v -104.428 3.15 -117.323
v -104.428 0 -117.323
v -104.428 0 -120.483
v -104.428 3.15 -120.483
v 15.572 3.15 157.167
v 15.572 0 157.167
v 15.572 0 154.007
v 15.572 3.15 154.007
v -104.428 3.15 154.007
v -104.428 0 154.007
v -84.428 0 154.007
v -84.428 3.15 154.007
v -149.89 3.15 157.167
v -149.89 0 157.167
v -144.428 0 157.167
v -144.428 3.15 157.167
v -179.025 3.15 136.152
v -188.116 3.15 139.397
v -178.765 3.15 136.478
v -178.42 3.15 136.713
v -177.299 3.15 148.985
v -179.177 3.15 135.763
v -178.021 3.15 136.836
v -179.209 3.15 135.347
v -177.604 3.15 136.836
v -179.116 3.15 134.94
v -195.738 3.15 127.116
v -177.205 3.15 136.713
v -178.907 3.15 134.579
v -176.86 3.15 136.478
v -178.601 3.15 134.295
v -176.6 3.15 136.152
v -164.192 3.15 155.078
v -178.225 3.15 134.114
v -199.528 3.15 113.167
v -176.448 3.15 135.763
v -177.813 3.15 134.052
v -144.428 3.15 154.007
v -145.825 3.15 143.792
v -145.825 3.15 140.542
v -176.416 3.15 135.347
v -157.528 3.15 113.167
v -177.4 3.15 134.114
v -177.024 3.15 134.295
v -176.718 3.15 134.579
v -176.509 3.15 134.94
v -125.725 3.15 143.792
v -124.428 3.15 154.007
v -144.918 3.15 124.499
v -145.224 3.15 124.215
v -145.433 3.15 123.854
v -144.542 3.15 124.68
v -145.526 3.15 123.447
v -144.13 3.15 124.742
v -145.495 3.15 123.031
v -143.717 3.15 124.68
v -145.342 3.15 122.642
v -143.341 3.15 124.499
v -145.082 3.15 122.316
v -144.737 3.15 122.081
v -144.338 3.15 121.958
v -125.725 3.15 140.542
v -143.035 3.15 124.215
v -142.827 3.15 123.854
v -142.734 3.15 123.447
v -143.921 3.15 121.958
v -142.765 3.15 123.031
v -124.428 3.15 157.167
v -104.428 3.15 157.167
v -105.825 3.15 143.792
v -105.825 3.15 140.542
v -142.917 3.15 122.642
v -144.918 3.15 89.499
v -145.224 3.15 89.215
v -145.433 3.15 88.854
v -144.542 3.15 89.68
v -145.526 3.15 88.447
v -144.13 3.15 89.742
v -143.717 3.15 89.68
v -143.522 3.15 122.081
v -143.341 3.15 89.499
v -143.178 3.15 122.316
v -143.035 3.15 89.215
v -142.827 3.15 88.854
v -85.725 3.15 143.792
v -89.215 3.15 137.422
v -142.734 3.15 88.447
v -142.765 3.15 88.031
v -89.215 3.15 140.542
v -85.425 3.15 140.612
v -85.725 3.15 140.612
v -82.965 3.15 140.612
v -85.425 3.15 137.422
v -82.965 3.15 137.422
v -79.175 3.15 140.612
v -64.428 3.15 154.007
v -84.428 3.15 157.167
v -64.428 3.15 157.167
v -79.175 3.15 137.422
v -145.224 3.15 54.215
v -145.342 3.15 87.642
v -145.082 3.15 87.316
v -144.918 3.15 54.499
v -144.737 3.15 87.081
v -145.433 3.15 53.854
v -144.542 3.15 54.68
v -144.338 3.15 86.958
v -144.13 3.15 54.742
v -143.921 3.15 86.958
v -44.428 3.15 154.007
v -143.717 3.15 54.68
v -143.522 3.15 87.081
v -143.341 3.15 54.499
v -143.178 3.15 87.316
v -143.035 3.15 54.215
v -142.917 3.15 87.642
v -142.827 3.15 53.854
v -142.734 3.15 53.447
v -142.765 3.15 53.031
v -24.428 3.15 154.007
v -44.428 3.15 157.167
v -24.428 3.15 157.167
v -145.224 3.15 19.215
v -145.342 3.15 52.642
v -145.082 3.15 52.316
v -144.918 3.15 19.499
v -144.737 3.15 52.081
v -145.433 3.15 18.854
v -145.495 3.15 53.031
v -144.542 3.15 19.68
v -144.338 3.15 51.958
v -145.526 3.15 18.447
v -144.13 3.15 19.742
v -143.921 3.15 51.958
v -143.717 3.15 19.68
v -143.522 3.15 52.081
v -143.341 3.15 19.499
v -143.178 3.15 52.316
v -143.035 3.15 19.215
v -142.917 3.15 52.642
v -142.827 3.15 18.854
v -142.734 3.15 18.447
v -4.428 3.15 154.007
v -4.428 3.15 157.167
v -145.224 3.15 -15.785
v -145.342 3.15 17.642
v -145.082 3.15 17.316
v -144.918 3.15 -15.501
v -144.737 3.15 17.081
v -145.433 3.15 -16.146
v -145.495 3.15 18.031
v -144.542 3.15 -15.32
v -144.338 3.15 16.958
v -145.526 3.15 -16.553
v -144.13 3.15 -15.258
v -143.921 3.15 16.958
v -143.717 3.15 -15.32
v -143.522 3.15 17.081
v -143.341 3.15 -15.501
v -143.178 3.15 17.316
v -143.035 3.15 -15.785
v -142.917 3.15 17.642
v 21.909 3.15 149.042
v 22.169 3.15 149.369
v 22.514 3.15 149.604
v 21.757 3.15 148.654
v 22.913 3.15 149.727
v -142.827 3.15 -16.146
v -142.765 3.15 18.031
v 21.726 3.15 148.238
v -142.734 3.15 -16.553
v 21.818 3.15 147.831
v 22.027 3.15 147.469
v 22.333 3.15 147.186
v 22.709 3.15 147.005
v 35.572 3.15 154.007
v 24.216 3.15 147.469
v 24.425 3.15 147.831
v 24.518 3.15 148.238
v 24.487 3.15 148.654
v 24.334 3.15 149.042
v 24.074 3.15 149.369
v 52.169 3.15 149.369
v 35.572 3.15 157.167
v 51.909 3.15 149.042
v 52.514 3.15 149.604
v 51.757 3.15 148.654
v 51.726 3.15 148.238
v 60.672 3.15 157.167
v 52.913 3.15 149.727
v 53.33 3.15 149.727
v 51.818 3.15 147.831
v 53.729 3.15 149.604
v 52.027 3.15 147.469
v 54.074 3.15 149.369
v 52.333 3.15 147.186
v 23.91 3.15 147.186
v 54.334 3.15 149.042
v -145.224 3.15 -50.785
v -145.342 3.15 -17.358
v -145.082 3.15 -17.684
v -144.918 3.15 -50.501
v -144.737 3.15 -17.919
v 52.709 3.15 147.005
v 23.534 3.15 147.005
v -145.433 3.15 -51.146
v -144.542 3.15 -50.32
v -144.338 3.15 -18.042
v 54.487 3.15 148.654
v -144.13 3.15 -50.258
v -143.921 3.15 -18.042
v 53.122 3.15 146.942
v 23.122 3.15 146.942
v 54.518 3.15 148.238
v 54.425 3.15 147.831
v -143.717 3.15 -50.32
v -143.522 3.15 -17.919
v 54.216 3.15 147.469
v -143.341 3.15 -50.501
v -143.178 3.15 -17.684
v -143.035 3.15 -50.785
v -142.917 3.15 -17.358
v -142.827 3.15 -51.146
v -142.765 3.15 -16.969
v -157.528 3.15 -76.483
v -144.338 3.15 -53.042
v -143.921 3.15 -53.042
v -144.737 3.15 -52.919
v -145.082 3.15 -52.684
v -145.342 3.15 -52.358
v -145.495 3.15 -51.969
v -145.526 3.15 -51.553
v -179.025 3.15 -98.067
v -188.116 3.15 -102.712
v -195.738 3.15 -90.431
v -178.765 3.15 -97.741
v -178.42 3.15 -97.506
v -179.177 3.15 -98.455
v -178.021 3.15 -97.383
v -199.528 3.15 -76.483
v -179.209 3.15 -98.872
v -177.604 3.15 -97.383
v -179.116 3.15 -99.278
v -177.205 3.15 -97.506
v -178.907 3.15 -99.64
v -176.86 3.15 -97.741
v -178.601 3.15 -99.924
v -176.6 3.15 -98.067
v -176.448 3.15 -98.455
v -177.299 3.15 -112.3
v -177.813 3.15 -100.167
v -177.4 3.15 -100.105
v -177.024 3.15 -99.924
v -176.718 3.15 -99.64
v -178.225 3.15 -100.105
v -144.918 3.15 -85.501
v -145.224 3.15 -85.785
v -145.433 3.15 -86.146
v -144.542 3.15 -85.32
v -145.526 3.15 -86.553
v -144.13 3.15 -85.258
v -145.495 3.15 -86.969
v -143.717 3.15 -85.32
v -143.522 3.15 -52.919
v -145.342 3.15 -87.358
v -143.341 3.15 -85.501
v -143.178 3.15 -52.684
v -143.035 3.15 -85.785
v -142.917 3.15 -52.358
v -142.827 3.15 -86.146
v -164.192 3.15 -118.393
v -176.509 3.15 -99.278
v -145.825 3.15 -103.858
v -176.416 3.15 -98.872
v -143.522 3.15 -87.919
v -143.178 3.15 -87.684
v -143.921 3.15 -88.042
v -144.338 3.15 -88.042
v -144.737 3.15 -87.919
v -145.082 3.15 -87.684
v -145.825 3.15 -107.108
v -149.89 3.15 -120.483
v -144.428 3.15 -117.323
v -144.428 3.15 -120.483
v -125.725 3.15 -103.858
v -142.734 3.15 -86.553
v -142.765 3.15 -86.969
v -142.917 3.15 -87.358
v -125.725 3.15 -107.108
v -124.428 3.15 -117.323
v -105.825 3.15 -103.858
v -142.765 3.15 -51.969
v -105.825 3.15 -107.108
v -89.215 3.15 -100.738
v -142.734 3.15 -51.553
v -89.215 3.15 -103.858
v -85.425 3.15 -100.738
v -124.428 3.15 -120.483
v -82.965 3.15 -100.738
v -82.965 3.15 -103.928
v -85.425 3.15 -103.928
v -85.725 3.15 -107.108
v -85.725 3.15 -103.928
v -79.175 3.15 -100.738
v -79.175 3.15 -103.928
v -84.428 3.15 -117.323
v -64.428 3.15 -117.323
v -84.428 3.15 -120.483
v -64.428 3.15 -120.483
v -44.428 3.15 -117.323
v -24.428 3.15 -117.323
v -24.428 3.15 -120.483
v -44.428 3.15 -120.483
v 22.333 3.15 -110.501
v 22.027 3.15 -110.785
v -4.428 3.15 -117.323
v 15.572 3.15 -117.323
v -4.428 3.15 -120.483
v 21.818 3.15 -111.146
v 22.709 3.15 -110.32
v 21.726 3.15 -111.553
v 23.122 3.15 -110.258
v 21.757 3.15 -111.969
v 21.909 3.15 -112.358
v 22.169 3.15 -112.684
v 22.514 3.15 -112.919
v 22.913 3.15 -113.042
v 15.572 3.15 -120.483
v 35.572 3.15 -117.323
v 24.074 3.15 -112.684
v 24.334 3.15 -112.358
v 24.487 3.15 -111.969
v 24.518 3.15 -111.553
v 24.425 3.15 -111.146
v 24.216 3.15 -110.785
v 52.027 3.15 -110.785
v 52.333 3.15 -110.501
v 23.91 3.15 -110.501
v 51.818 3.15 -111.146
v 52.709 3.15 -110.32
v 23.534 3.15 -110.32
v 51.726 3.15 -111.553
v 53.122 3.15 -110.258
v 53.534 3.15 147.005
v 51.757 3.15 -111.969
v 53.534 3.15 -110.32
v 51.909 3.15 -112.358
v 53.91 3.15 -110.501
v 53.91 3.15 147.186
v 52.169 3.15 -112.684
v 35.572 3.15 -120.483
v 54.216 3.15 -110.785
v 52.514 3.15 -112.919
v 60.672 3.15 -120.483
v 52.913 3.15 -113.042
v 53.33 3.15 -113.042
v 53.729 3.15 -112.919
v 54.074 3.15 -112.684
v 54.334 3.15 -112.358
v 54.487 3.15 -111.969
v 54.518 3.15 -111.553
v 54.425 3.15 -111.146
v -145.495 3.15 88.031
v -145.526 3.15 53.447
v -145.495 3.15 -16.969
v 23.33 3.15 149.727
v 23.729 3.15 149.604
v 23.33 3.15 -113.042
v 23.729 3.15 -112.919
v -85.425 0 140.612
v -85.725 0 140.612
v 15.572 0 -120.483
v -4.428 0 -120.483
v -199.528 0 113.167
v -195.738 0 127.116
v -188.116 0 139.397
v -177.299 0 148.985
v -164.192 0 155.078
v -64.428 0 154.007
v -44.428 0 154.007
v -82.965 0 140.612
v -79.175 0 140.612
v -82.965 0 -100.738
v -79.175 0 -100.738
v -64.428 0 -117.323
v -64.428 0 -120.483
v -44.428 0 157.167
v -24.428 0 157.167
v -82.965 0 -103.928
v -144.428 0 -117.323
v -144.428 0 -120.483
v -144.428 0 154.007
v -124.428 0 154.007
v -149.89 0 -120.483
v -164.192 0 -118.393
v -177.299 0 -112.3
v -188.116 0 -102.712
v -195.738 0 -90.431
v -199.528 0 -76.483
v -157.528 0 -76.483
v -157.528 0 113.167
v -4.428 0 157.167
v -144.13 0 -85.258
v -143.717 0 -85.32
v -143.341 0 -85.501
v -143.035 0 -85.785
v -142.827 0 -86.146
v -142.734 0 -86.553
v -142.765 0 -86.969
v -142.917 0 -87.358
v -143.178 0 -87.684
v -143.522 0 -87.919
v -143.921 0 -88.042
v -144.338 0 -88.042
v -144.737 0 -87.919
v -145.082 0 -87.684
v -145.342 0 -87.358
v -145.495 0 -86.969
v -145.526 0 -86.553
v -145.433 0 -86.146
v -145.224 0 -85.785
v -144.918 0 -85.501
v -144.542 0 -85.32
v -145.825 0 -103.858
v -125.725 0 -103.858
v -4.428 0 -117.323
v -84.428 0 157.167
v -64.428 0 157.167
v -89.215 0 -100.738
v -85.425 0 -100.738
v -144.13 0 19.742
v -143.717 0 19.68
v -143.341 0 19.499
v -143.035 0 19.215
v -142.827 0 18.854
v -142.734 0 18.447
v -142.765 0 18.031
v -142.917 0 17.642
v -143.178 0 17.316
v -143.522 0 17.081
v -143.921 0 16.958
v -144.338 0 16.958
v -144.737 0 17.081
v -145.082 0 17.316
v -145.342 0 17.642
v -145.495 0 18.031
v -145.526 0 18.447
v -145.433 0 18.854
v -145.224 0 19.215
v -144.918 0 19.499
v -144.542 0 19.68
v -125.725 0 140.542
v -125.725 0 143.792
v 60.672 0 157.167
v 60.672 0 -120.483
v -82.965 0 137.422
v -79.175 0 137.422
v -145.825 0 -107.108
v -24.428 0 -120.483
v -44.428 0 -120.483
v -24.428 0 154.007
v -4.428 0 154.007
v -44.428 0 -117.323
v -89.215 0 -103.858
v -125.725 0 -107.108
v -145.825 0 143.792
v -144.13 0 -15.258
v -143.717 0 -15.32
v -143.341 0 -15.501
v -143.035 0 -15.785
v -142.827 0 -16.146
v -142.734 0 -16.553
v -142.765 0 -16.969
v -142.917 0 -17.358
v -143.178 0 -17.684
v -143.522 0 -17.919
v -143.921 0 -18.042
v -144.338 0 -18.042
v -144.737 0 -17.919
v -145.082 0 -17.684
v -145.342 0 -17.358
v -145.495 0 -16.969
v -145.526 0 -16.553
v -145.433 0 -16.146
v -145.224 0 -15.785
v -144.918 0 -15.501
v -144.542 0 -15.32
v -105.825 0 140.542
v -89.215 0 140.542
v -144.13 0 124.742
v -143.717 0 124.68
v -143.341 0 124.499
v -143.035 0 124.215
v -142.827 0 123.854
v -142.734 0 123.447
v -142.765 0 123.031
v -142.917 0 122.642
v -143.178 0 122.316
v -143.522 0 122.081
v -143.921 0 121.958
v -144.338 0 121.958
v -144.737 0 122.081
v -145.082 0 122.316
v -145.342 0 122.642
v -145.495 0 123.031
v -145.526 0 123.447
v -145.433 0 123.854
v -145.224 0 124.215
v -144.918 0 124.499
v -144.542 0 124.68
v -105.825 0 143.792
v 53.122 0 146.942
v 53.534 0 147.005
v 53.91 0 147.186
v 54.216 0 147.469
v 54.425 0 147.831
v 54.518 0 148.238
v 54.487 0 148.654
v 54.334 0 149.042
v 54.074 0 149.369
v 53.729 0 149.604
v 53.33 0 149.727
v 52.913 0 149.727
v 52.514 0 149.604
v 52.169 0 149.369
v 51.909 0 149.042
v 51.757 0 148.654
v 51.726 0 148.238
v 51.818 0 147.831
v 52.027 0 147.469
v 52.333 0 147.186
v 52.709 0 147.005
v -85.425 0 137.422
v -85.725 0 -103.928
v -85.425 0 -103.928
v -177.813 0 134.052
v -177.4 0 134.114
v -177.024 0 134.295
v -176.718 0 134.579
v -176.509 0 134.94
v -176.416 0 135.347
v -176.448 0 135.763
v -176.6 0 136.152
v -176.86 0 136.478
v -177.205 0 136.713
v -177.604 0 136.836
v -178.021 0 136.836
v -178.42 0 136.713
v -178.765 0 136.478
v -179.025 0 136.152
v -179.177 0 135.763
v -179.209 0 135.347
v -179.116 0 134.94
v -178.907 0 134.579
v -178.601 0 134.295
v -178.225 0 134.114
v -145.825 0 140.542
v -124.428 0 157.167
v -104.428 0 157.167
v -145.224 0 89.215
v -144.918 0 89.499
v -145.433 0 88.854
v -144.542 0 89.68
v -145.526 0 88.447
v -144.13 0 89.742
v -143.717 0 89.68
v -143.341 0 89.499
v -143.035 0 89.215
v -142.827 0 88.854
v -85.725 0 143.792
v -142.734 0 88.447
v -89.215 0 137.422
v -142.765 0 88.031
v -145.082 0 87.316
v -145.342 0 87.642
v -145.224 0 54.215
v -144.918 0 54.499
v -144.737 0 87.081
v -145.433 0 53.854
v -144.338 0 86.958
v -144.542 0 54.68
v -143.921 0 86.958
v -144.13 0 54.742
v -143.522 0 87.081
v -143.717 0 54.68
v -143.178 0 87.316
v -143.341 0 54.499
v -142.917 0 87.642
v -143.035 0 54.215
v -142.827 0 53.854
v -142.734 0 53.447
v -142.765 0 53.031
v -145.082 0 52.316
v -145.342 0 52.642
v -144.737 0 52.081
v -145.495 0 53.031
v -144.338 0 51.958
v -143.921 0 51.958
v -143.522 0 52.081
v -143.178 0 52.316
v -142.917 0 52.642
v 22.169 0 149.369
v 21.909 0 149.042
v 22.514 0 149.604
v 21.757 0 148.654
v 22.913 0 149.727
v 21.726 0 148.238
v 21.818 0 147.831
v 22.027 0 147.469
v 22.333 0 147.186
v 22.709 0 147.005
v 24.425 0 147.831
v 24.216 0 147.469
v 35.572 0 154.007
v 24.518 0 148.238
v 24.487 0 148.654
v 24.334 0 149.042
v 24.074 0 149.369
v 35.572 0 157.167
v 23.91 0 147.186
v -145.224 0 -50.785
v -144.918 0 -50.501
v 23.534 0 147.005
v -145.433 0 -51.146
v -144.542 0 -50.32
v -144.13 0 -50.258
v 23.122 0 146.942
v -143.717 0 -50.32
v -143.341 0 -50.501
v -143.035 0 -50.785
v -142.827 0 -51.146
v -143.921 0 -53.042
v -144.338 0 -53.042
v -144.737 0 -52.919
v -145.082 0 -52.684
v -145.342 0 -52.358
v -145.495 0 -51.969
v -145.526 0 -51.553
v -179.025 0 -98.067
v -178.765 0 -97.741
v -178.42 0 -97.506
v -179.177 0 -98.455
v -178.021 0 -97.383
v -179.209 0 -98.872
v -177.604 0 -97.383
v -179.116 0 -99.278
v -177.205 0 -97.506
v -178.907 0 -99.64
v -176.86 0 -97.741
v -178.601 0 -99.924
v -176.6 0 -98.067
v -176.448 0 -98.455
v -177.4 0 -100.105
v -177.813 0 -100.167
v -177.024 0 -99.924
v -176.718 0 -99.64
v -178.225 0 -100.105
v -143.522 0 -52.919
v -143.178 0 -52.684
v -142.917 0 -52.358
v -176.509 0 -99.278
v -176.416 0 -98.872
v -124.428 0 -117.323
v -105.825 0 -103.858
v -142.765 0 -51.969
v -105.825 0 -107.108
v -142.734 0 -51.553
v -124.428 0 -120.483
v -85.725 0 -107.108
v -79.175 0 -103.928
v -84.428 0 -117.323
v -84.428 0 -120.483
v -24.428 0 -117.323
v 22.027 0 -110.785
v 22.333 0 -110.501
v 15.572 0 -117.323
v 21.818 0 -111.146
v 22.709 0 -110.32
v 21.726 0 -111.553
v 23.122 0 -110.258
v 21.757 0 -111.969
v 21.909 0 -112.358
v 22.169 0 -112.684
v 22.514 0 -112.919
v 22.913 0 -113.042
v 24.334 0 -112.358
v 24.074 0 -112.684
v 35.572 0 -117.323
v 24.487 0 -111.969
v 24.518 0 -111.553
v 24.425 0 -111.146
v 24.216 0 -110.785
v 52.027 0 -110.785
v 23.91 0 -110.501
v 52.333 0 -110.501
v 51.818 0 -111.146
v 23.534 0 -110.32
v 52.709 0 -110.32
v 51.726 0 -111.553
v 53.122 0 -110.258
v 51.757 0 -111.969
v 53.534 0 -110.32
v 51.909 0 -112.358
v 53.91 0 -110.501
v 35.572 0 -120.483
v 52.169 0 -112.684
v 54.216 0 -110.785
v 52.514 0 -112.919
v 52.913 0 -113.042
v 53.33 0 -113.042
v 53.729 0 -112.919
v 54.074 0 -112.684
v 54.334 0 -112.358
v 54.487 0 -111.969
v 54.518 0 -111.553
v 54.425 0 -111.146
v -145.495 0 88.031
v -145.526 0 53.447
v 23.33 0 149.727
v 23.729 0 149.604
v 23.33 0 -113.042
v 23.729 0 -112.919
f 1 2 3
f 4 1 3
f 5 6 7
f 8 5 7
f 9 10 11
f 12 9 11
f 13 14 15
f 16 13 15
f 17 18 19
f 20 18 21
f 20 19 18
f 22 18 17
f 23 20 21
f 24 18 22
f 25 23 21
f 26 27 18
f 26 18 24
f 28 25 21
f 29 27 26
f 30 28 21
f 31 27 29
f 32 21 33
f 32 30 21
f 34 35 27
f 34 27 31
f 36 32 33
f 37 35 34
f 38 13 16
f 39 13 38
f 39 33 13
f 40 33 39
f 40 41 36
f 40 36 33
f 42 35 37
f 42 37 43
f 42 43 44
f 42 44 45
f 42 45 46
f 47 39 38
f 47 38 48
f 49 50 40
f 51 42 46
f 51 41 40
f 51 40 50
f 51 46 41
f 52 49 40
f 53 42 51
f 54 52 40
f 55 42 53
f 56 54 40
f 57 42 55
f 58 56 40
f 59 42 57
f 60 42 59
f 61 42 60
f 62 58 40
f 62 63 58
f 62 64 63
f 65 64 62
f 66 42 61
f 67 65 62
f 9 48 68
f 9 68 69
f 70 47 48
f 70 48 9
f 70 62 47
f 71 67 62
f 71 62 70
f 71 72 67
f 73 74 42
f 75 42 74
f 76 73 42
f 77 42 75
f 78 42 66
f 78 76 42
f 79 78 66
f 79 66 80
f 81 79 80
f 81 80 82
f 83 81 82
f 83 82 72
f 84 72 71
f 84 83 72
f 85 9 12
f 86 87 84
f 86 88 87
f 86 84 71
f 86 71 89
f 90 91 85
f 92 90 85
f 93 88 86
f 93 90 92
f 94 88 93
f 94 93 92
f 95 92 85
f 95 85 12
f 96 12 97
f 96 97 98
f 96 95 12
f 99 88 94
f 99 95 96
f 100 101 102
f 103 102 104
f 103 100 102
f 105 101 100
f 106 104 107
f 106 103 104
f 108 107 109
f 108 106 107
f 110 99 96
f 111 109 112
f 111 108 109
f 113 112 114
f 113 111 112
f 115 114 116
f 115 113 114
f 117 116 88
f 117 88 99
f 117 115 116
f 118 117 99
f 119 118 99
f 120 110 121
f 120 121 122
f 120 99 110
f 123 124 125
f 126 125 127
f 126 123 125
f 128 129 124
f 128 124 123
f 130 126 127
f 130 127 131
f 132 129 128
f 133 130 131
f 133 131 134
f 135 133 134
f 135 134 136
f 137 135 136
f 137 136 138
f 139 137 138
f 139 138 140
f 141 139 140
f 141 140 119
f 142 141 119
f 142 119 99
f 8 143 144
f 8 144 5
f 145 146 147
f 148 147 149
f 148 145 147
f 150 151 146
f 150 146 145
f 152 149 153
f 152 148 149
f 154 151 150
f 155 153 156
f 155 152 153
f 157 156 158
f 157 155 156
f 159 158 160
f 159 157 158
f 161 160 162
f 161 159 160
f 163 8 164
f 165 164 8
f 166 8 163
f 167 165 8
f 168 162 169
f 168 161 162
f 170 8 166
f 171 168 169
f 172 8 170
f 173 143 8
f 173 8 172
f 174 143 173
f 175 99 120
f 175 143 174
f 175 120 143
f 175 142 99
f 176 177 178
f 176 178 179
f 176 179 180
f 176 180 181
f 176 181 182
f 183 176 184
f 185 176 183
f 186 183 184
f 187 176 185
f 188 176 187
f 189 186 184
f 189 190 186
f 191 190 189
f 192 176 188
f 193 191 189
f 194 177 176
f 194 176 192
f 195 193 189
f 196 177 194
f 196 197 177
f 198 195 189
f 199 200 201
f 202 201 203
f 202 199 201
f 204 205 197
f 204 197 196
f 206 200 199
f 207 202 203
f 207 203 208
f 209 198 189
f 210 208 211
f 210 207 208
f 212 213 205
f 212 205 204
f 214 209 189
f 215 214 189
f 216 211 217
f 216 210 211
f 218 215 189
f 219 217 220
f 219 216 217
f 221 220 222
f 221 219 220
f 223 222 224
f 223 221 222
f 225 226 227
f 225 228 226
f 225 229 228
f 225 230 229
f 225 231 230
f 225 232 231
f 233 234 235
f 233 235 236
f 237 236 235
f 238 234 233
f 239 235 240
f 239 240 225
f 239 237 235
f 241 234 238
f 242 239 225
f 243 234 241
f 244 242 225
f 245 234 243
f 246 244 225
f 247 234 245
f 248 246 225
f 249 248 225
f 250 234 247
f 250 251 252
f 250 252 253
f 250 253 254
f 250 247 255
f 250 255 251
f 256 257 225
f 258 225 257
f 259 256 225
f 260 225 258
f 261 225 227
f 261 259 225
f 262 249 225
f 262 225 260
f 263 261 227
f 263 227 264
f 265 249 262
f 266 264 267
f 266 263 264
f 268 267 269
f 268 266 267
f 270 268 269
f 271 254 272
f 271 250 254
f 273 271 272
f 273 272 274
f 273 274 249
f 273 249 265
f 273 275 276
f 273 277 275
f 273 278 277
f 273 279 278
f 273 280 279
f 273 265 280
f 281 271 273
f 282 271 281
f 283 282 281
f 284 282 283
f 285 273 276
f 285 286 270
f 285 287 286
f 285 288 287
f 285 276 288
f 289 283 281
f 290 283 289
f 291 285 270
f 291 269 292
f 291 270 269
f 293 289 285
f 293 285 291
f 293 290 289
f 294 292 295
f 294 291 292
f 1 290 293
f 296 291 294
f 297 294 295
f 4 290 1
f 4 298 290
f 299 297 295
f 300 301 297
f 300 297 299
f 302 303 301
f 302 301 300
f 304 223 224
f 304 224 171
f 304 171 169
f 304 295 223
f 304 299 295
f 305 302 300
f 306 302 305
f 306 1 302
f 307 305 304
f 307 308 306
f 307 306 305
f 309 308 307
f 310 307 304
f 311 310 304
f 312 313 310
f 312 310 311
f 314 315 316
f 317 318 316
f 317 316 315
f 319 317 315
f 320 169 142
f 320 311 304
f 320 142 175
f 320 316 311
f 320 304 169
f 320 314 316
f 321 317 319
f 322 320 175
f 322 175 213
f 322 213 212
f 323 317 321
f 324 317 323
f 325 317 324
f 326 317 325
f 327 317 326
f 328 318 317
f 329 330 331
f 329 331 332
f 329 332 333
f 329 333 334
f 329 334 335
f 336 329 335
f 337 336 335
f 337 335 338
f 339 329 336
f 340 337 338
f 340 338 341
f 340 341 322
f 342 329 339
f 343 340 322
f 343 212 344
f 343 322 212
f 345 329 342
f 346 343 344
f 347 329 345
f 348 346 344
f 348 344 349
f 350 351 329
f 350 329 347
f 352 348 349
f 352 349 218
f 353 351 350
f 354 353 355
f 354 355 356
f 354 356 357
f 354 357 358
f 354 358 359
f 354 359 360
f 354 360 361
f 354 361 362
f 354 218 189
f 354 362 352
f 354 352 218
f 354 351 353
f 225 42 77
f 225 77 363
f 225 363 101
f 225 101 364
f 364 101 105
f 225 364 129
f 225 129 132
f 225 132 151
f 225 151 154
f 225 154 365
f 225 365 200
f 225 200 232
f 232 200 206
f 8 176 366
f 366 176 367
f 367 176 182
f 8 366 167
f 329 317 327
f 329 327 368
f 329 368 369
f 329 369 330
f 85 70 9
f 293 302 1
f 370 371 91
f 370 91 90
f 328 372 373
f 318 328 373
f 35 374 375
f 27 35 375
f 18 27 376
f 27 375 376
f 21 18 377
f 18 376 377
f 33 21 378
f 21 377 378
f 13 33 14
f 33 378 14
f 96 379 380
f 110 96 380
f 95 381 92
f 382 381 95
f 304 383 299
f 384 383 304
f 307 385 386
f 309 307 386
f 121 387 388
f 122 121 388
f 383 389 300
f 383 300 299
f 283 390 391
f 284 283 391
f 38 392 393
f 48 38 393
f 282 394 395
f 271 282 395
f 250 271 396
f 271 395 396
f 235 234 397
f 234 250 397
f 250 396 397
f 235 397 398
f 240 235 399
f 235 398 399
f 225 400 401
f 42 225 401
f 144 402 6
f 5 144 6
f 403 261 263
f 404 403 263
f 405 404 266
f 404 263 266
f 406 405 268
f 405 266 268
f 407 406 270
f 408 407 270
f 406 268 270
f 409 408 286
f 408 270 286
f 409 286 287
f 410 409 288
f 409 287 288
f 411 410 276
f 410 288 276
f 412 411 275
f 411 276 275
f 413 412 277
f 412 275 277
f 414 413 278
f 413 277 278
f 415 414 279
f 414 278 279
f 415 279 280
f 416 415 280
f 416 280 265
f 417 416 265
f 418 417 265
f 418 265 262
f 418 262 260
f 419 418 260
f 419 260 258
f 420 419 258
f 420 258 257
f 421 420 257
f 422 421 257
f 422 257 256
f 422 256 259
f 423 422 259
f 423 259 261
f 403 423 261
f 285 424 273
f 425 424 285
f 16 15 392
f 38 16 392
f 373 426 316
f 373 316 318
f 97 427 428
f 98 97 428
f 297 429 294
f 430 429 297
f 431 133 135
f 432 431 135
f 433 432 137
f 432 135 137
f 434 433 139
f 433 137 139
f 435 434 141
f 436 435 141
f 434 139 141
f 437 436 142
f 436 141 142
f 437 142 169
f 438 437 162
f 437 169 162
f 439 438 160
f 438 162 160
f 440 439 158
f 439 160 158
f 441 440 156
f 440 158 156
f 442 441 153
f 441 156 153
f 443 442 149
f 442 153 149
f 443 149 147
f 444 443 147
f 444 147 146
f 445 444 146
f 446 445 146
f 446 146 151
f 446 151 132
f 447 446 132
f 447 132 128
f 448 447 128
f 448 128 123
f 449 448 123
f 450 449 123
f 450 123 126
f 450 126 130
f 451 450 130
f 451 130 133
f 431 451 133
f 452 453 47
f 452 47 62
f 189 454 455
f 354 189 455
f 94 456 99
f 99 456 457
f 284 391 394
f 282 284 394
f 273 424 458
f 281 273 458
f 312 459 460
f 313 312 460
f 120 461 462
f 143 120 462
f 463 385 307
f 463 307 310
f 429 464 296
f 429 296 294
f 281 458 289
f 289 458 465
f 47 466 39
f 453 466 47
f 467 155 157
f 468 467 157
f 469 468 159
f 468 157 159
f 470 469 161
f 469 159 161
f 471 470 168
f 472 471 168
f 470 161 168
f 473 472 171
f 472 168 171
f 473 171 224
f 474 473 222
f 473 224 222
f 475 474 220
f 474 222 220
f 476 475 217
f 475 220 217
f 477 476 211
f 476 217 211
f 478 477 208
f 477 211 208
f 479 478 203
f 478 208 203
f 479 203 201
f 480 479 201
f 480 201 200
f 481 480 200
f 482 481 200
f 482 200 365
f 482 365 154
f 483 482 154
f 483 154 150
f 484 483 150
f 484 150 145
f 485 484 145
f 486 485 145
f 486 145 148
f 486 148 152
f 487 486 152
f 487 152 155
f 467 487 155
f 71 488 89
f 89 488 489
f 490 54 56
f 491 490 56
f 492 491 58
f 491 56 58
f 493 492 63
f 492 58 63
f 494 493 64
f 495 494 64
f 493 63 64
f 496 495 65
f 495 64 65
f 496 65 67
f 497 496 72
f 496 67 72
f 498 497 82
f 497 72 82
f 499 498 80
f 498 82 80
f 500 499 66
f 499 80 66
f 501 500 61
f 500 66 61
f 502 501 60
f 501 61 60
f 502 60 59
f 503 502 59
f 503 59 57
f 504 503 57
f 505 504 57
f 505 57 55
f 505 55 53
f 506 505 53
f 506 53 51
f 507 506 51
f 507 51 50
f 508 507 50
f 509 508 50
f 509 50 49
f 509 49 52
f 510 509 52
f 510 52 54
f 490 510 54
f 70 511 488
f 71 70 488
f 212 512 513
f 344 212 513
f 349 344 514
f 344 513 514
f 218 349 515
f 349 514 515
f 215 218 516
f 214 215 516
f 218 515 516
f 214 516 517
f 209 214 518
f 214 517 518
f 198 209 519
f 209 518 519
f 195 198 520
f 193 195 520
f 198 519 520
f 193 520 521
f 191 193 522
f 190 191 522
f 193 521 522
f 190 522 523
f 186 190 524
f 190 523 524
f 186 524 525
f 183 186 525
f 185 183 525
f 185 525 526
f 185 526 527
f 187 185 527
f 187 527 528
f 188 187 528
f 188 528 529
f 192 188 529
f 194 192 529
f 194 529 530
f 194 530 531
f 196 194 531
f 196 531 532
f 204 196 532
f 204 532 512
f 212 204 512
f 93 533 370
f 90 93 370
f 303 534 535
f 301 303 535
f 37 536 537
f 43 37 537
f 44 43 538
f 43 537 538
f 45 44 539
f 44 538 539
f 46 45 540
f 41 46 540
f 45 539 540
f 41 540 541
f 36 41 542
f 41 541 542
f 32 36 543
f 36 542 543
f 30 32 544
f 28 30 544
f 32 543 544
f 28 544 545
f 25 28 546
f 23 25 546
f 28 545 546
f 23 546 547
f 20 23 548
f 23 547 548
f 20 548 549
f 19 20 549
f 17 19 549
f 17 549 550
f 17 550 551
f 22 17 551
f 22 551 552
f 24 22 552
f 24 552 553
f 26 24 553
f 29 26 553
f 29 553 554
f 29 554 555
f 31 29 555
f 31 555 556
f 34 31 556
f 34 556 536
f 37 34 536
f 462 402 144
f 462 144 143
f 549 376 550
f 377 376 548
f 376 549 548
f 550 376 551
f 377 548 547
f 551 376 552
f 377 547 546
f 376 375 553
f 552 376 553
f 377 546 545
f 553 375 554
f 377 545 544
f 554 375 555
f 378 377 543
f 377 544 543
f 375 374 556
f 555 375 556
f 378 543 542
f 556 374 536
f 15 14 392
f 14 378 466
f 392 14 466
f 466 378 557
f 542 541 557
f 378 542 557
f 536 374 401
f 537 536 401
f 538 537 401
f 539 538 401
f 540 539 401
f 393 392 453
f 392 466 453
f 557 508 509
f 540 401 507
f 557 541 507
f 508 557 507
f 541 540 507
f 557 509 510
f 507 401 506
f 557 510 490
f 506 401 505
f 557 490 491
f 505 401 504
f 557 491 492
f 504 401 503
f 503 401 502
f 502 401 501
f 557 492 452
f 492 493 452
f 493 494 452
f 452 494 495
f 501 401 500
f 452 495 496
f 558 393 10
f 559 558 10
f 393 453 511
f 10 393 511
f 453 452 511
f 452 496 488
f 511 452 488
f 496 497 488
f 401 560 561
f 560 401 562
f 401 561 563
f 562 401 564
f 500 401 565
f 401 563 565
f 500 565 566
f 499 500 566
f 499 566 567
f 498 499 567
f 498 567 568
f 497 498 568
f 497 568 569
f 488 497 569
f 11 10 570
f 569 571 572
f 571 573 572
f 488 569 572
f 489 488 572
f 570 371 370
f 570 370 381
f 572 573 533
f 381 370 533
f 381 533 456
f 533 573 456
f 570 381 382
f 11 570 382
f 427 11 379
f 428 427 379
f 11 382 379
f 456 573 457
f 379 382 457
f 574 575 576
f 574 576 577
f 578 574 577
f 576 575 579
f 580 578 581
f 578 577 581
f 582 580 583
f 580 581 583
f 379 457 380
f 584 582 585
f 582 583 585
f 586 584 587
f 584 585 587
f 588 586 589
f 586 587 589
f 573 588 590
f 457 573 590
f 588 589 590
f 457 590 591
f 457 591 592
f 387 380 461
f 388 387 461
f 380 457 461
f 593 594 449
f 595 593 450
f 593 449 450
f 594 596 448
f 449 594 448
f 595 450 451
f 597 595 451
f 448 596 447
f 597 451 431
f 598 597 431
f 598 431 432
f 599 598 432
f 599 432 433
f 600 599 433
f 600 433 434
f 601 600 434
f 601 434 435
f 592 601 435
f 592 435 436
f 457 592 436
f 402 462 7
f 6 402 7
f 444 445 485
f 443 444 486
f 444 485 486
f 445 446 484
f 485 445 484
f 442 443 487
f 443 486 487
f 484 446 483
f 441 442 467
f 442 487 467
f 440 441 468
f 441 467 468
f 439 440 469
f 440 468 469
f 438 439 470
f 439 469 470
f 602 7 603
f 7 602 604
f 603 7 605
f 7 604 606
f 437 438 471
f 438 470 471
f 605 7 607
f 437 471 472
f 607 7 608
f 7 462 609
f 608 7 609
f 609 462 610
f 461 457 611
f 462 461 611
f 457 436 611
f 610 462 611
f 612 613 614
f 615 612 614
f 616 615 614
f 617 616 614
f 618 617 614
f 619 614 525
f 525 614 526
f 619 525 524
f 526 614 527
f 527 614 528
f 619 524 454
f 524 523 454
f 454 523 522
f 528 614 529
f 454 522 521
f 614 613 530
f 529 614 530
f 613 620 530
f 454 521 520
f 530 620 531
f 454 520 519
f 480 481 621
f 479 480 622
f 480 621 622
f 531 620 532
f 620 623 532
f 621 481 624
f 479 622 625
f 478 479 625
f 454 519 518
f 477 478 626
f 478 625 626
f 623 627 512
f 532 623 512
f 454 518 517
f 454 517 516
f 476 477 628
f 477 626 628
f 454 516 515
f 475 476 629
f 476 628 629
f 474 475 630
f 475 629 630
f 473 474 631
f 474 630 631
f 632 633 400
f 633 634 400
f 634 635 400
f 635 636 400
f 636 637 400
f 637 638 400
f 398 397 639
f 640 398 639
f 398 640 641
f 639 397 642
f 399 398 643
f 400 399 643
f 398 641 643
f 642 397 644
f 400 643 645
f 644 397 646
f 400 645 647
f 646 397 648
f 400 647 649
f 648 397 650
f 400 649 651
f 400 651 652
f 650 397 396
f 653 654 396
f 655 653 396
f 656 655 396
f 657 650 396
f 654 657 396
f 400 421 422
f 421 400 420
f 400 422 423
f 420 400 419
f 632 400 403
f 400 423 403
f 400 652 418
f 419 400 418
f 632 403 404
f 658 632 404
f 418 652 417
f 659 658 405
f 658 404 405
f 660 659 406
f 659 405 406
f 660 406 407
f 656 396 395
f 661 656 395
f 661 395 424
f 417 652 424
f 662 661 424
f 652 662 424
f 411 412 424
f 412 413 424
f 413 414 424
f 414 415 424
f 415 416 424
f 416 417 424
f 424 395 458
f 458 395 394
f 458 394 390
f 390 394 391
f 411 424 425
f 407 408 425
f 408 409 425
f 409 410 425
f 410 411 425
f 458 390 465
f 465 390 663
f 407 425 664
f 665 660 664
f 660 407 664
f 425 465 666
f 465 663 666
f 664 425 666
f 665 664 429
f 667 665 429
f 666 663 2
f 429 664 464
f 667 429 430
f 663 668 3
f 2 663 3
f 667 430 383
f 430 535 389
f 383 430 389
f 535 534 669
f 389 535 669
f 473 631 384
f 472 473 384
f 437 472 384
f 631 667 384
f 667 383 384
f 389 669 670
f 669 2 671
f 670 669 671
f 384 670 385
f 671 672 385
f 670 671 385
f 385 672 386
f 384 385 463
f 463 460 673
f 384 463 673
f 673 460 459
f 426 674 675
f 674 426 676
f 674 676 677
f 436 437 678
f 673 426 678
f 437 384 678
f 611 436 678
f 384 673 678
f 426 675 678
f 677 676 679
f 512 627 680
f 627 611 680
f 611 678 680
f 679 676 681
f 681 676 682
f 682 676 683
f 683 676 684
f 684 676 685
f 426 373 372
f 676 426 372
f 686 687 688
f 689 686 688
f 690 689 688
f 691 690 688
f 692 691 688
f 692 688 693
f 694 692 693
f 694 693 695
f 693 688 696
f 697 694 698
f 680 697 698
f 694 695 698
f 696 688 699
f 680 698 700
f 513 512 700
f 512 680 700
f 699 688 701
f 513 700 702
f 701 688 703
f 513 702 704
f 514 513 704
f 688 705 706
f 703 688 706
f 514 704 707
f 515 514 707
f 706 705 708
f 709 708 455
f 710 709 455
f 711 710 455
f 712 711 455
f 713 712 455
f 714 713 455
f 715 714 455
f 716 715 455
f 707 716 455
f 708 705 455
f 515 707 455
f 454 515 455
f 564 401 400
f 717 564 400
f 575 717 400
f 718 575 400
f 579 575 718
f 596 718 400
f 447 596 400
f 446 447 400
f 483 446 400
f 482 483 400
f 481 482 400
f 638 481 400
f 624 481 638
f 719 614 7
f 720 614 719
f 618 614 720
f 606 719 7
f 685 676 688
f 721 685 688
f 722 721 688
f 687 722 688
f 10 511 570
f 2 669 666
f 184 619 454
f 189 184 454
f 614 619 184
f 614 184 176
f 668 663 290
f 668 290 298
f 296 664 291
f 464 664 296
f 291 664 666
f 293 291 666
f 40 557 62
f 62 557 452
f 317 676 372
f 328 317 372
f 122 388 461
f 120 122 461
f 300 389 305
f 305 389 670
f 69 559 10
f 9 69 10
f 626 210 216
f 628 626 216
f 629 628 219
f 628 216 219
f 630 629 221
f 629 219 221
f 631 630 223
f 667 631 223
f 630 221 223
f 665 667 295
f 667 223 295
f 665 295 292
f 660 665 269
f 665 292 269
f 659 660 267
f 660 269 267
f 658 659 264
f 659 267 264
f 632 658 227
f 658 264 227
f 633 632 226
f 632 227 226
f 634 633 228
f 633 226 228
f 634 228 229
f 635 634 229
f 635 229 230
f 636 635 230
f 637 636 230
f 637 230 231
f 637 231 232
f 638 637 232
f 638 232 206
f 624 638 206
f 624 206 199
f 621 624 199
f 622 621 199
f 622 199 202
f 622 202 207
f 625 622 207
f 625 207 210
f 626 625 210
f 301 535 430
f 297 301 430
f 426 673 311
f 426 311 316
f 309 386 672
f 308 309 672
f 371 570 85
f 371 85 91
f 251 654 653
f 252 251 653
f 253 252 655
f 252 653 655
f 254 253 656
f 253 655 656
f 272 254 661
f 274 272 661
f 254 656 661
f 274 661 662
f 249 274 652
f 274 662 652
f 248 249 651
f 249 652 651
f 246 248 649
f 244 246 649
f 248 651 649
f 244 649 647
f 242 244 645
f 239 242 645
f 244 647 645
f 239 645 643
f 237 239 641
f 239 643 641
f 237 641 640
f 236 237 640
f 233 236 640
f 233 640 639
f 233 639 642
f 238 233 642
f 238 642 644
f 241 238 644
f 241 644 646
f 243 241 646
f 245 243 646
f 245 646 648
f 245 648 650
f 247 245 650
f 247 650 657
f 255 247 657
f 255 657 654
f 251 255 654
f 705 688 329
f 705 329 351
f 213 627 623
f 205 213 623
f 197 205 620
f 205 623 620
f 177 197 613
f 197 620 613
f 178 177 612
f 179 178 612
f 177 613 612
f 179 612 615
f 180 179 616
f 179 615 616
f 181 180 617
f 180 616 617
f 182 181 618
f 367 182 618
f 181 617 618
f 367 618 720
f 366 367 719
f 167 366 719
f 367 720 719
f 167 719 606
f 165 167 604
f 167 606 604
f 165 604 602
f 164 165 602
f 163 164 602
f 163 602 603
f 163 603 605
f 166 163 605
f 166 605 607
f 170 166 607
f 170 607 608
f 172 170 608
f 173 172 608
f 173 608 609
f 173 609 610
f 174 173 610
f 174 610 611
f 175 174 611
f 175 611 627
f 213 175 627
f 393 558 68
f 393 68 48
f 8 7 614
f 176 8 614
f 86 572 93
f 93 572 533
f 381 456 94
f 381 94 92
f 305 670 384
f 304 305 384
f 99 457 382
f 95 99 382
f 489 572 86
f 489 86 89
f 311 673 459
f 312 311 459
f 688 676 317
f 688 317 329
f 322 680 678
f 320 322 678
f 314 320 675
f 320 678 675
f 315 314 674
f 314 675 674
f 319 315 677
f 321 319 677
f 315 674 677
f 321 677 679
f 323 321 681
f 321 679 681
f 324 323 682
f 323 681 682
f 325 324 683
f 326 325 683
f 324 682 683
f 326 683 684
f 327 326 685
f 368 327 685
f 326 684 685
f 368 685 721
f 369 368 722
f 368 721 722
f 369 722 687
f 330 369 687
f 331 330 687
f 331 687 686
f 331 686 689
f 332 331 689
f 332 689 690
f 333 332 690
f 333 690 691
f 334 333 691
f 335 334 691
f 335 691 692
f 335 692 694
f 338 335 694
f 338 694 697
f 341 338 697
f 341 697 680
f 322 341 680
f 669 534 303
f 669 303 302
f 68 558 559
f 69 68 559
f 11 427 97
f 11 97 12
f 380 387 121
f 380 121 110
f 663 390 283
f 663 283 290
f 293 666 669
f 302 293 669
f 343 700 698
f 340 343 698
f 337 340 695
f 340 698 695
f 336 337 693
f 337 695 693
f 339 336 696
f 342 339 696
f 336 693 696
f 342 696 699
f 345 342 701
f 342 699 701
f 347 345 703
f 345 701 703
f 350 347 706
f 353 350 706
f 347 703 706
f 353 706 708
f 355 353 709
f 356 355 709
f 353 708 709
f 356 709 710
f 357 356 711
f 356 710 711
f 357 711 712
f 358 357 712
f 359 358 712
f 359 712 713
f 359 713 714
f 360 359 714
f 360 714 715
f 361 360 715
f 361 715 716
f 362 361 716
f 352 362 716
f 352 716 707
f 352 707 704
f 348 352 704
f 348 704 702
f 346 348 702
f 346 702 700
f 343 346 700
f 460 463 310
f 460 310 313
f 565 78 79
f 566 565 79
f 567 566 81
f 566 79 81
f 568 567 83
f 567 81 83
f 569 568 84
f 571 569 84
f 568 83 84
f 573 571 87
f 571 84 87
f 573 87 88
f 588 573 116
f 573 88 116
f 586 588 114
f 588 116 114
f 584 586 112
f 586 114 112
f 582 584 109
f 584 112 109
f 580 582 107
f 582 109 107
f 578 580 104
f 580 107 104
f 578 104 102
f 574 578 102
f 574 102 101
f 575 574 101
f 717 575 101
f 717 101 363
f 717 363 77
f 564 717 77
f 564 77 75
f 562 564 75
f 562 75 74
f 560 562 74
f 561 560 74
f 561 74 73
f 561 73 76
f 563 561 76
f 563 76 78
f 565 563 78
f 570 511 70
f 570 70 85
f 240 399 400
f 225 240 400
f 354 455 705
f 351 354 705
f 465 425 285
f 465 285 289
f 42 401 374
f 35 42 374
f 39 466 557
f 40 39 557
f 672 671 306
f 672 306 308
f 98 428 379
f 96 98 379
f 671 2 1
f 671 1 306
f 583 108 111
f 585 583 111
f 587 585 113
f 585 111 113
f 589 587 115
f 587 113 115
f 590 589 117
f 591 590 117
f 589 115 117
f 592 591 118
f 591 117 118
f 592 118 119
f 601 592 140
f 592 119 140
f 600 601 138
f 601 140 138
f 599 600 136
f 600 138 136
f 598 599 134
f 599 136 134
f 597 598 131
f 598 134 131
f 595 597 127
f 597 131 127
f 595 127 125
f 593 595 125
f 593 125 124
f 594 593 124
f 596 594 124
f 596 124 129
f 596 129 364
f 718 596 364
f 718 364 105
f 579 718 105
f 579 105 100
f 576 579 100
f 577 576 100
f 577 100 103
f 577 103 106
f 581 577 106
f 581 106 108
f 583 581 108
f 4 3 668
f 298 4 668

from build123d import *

# Parameters (mm, degrees)
SKETCH2_W           = 20.1
SKETCH2_H           = 3.25
BOSS_EXTRUDE1_DEPTH = 3.15
FILLET1_R           = 50
SKETCH5_W           = 20
SKETCH5_H           = 3.16
CUT_EXTRUDE2_DEPTH  = 255.013877696
SKETCH7_R           = 1.4
CUT_EXTRUDE3_DEPTH  = 255.013877696
SKETCH8_R           = 1.4
CUT_EXTRUDE4_DEPTH  = 10
SKETCH10_R          = 1.4
CUT_EXTRUDE5_DEPTH  = 10
SKETCH11_W          = 3.79
SKETCH11_H          = 3.19
CUT_EXTRUDE6_DEPTH  = 10


with BuildPart() as part:
    # Sketch2 → Boss-Extrude1 (new body)
    with BuildSketch(Plane(origin=(0, 0, 0), x_dir=(1, 0, 0), z_dir=(0, 1, 0))):
        Polygon((-199.52829939, 76.482620099), (-157.52829939, 76.482620099), (-157.52829939, -113.167379901), (-199.52829939, -113.167379901), (-199.52829939, -157.167379901), (60.67170061, -157.167379901), (60.67170061, 120.482620099), (-199.52829939, 120.482620099), align=None)
        with Locations((-95.774503115, 105.482620099)):
            Rectangle(SKETCH2_W, SKETCH2_H, mode=Mode.SUBTRACT)
        with Locations((-135.774503115, -142.167379901)):
            Rectangle(SKETCH2_W, SKETCH2_H, mode=Mode.SUBTRACT)
        with Locations((-95.774503115, -142.167379901)):
            Rectangle(SKETCH2_W, SKETCH2_H, mode=Mode.SUBTRACT)
        with Locations((-135.774503115, 105.482620099)):
            Rectangle(SKETCH2_W, SKETCH2_H, mode=Mode.SUBTRACT)
    extrude(amount=BOSS_EXTRUDE1_DEPTH)

    # Fillet1
    # the kernel refuses this fillet: 50 mm, written as the material it takes off along each edge
    with BuildSketch(Plane(origin=(-199.52829939, -124.09673646, -120.482620099), x_dir=(1, 0, 0), z_dir=(0, 1, 0))) as fillet1_piece_1:
        with BuildLine():
            CenterArc((49.638694584, -50), FILLET1_R, 90, 83.107897421)
            Line((0, -44), (-0.992773892, -43.88))
            ThreePointArc((-0.992773892, -43.88), (-1, -22), (-1, 0))
            Line((-1, 0), (0, 1))
            Line((0, 1), (49.638694584, 1))
            Line((49.638694584, 1), (49.638694584, 0))
        make_face()
    extrude(amount=251.34347292, mode=Mode.SUBTRACT)
    with BuildSketch(Plane(origin=(-199.52829939, -124.09673646, 157.167379901), x_dir=(0, 0, -1), z_dir=(0, 1, 0))) as fillet1_piece_2:
        with BuildLine():
            CenterArc((50, -49.638694584), FILLET1_R, 96.892102579, 83.107897421)
            Line((0, -49.638694584), (-1, -49.638694584))
            Line((-1, -49.638694584), (-1, 0))
            Line((-1, 0), (0, 1))
            ThreePointArc((0, 1), (22, 1), (43.88, 0.992773892))
            Line((43.88, 0.992773892), (44, 0))
        make_face()
    extrude(amount=251.34347292, mode=Mode.SUBTRACT)

    # Sketch5 → Cut-Extrude2 (cut, through all)
    with BuildSketch(Plane(origin=(0, 0, 0), x_dir=(1, 0, 0), z_dir=(0, 1, 0))):
        with Locations((-94.42829939, 118.902620099)):
            Rectangle(SKETCH5_W, SKETCH5_H)
        with Locations((-134.42829939, 118.902620099)):
            Rectangle(SKETCH5_W, SKETCH5_H)
        with Locations((-54.42829939, 118.902620099)):
            Rectangle(SKETCH5_W, SKETCH5_H)
        with Locations((-14.42829939, 118.902620099)):
            Rectangle(SKETCH5_W, SKETCH5_H)
        with Locations((25.57170061, 118.902620099)):
            Rectangle(SKETCH5_W, SKETCH5_H)
        with Locations((25.57170061, -155.587379901)):
            Rectangle(SKETCH5_W, SKETCH5_H)
        with Locations((-14.42829939, -155.587379901)):
            Rectangle(SKETCH5_W, SKETCH5_H)
        with Locations((-54.42829939, -155.587379901)):
            Rectangle(SKETCH5_W, SKETCH5_H)
        with Locations((-94.42829939, -155.587379901)):
            Rectangle(SKETCH5_W, SKETCH5_H)
        with Locations((-134.42829939, -155.587379901)):
            Rectangle(SKETCH5_W, SKETCH5_H)
    extrude(amount=CUT_EXTRUDE2_DEPTH, mode=Mode.SUBTRACT)

    # Sketch7 → Cut-Extrude3 (cut, through all)
    with BuildSketch(Plane.XZ):
        with Locations(Location((23.12170061, 148.342379901, 0), (0, 0, 270))):
            Circle(SKETCH7_R)
        with Locations(Location((53.12170061, 148.342379901, 0), (0, 0, 270))):
            Circle(SKETCH7_R)
        with Locations(Location((53.12170061, -111.657620099, 0), (0, 0, 90))):
            Circle(SKETCH7_R)
        with Locations(Location((23.12170061, -111.657620099, 0), (0, 0, 90))):
            Circle(SKETCH7_R)
    extrude(amount=-CUT_EXTRUDE3_DEPTH, mode=Mode.SUBTRACT)

    # Sketch8 → Cut-Extrude4 (cut)
    with BuildSketch(Plane.XZ):
        with Locations(Location((-177.812570637, 135.451651148, 0), (0, 0, 270))):
            Circle(SKETCH8_R)
        with Locations(Location((-177.812570637, -98.766891346, 0), (0, 0, 270))):
            Circle(SKETCH8_R)
    extrude(amount=-CUT_EXTRUDE4_DEPTH, mode=Mode.SUBTRACT)

    # Sketch10 → Cut-Extrude5 (cut)
    with BuildSketch(Plane(origin=(0, 3.15, 0), x_dir=(1, 0, 0), z_dir=(0, 1, 0))):
        with Locations(Location((-144.129756514, -123.342379901, 0), (0, 0, 270))):
            Circle(SKETCH10_R)
        with Locations(Location((-144.129756514, 86.657620099, 0), (0, 0, 270))):
            Circle(SKETCH10_R)
        with Locations(Location((-144.129756514, 51.657620099, 0), (0, 0, 270))):
            Circle(SKETCH10_R)
        with Locations(Location((-144.129756514, 16.657620099, 0), (0, 0, 270))):
            Circle(SKETCH10_R)
        with Locations(Location((-144.129756514, -18.342379901, 0), (0, 0, 270))):
            Circle(SKETCH10_R)
        with Locations(Location((-144.129756514, -53.342379901, 0), (0, 0, 270))):
            Circle(SKETCH10_R)
        with Locations(Location((-144.129756514, -88.342379901, 0), (0, 0, 270))):
            Circle(SKETCH10_R)
    extrude(amount=-CUT_EXTRUDE5_DEPTH, mode=Mode.SUBTRACT)

    # Sketch11 → Cut-Extrude6 (cut)
    with BuildSketch(Plane.XZ):
        with Locations((-87.319899774, -102.332620099)):
            Rectangle(SKETCH11_W, SKETCH11_H)
        with Locations((-81.069899774, -102.332620099)):
            Rectangle(SKETCH11_W, SKETCH11_H)
        with Locations((-87.319899774, 139.017379901)):
            Rectangle(SKETCH11_W, SKETCH11_H)
        with Locations((-81.069899774, 139.017379901)):
            Rectangle(SKETCH11_W, SKETCH11_H)
    extrude(amount=-CUT_EXTRUDE6_DEPTH, mode=Mode.SUBTRACT)


solid = part.part
